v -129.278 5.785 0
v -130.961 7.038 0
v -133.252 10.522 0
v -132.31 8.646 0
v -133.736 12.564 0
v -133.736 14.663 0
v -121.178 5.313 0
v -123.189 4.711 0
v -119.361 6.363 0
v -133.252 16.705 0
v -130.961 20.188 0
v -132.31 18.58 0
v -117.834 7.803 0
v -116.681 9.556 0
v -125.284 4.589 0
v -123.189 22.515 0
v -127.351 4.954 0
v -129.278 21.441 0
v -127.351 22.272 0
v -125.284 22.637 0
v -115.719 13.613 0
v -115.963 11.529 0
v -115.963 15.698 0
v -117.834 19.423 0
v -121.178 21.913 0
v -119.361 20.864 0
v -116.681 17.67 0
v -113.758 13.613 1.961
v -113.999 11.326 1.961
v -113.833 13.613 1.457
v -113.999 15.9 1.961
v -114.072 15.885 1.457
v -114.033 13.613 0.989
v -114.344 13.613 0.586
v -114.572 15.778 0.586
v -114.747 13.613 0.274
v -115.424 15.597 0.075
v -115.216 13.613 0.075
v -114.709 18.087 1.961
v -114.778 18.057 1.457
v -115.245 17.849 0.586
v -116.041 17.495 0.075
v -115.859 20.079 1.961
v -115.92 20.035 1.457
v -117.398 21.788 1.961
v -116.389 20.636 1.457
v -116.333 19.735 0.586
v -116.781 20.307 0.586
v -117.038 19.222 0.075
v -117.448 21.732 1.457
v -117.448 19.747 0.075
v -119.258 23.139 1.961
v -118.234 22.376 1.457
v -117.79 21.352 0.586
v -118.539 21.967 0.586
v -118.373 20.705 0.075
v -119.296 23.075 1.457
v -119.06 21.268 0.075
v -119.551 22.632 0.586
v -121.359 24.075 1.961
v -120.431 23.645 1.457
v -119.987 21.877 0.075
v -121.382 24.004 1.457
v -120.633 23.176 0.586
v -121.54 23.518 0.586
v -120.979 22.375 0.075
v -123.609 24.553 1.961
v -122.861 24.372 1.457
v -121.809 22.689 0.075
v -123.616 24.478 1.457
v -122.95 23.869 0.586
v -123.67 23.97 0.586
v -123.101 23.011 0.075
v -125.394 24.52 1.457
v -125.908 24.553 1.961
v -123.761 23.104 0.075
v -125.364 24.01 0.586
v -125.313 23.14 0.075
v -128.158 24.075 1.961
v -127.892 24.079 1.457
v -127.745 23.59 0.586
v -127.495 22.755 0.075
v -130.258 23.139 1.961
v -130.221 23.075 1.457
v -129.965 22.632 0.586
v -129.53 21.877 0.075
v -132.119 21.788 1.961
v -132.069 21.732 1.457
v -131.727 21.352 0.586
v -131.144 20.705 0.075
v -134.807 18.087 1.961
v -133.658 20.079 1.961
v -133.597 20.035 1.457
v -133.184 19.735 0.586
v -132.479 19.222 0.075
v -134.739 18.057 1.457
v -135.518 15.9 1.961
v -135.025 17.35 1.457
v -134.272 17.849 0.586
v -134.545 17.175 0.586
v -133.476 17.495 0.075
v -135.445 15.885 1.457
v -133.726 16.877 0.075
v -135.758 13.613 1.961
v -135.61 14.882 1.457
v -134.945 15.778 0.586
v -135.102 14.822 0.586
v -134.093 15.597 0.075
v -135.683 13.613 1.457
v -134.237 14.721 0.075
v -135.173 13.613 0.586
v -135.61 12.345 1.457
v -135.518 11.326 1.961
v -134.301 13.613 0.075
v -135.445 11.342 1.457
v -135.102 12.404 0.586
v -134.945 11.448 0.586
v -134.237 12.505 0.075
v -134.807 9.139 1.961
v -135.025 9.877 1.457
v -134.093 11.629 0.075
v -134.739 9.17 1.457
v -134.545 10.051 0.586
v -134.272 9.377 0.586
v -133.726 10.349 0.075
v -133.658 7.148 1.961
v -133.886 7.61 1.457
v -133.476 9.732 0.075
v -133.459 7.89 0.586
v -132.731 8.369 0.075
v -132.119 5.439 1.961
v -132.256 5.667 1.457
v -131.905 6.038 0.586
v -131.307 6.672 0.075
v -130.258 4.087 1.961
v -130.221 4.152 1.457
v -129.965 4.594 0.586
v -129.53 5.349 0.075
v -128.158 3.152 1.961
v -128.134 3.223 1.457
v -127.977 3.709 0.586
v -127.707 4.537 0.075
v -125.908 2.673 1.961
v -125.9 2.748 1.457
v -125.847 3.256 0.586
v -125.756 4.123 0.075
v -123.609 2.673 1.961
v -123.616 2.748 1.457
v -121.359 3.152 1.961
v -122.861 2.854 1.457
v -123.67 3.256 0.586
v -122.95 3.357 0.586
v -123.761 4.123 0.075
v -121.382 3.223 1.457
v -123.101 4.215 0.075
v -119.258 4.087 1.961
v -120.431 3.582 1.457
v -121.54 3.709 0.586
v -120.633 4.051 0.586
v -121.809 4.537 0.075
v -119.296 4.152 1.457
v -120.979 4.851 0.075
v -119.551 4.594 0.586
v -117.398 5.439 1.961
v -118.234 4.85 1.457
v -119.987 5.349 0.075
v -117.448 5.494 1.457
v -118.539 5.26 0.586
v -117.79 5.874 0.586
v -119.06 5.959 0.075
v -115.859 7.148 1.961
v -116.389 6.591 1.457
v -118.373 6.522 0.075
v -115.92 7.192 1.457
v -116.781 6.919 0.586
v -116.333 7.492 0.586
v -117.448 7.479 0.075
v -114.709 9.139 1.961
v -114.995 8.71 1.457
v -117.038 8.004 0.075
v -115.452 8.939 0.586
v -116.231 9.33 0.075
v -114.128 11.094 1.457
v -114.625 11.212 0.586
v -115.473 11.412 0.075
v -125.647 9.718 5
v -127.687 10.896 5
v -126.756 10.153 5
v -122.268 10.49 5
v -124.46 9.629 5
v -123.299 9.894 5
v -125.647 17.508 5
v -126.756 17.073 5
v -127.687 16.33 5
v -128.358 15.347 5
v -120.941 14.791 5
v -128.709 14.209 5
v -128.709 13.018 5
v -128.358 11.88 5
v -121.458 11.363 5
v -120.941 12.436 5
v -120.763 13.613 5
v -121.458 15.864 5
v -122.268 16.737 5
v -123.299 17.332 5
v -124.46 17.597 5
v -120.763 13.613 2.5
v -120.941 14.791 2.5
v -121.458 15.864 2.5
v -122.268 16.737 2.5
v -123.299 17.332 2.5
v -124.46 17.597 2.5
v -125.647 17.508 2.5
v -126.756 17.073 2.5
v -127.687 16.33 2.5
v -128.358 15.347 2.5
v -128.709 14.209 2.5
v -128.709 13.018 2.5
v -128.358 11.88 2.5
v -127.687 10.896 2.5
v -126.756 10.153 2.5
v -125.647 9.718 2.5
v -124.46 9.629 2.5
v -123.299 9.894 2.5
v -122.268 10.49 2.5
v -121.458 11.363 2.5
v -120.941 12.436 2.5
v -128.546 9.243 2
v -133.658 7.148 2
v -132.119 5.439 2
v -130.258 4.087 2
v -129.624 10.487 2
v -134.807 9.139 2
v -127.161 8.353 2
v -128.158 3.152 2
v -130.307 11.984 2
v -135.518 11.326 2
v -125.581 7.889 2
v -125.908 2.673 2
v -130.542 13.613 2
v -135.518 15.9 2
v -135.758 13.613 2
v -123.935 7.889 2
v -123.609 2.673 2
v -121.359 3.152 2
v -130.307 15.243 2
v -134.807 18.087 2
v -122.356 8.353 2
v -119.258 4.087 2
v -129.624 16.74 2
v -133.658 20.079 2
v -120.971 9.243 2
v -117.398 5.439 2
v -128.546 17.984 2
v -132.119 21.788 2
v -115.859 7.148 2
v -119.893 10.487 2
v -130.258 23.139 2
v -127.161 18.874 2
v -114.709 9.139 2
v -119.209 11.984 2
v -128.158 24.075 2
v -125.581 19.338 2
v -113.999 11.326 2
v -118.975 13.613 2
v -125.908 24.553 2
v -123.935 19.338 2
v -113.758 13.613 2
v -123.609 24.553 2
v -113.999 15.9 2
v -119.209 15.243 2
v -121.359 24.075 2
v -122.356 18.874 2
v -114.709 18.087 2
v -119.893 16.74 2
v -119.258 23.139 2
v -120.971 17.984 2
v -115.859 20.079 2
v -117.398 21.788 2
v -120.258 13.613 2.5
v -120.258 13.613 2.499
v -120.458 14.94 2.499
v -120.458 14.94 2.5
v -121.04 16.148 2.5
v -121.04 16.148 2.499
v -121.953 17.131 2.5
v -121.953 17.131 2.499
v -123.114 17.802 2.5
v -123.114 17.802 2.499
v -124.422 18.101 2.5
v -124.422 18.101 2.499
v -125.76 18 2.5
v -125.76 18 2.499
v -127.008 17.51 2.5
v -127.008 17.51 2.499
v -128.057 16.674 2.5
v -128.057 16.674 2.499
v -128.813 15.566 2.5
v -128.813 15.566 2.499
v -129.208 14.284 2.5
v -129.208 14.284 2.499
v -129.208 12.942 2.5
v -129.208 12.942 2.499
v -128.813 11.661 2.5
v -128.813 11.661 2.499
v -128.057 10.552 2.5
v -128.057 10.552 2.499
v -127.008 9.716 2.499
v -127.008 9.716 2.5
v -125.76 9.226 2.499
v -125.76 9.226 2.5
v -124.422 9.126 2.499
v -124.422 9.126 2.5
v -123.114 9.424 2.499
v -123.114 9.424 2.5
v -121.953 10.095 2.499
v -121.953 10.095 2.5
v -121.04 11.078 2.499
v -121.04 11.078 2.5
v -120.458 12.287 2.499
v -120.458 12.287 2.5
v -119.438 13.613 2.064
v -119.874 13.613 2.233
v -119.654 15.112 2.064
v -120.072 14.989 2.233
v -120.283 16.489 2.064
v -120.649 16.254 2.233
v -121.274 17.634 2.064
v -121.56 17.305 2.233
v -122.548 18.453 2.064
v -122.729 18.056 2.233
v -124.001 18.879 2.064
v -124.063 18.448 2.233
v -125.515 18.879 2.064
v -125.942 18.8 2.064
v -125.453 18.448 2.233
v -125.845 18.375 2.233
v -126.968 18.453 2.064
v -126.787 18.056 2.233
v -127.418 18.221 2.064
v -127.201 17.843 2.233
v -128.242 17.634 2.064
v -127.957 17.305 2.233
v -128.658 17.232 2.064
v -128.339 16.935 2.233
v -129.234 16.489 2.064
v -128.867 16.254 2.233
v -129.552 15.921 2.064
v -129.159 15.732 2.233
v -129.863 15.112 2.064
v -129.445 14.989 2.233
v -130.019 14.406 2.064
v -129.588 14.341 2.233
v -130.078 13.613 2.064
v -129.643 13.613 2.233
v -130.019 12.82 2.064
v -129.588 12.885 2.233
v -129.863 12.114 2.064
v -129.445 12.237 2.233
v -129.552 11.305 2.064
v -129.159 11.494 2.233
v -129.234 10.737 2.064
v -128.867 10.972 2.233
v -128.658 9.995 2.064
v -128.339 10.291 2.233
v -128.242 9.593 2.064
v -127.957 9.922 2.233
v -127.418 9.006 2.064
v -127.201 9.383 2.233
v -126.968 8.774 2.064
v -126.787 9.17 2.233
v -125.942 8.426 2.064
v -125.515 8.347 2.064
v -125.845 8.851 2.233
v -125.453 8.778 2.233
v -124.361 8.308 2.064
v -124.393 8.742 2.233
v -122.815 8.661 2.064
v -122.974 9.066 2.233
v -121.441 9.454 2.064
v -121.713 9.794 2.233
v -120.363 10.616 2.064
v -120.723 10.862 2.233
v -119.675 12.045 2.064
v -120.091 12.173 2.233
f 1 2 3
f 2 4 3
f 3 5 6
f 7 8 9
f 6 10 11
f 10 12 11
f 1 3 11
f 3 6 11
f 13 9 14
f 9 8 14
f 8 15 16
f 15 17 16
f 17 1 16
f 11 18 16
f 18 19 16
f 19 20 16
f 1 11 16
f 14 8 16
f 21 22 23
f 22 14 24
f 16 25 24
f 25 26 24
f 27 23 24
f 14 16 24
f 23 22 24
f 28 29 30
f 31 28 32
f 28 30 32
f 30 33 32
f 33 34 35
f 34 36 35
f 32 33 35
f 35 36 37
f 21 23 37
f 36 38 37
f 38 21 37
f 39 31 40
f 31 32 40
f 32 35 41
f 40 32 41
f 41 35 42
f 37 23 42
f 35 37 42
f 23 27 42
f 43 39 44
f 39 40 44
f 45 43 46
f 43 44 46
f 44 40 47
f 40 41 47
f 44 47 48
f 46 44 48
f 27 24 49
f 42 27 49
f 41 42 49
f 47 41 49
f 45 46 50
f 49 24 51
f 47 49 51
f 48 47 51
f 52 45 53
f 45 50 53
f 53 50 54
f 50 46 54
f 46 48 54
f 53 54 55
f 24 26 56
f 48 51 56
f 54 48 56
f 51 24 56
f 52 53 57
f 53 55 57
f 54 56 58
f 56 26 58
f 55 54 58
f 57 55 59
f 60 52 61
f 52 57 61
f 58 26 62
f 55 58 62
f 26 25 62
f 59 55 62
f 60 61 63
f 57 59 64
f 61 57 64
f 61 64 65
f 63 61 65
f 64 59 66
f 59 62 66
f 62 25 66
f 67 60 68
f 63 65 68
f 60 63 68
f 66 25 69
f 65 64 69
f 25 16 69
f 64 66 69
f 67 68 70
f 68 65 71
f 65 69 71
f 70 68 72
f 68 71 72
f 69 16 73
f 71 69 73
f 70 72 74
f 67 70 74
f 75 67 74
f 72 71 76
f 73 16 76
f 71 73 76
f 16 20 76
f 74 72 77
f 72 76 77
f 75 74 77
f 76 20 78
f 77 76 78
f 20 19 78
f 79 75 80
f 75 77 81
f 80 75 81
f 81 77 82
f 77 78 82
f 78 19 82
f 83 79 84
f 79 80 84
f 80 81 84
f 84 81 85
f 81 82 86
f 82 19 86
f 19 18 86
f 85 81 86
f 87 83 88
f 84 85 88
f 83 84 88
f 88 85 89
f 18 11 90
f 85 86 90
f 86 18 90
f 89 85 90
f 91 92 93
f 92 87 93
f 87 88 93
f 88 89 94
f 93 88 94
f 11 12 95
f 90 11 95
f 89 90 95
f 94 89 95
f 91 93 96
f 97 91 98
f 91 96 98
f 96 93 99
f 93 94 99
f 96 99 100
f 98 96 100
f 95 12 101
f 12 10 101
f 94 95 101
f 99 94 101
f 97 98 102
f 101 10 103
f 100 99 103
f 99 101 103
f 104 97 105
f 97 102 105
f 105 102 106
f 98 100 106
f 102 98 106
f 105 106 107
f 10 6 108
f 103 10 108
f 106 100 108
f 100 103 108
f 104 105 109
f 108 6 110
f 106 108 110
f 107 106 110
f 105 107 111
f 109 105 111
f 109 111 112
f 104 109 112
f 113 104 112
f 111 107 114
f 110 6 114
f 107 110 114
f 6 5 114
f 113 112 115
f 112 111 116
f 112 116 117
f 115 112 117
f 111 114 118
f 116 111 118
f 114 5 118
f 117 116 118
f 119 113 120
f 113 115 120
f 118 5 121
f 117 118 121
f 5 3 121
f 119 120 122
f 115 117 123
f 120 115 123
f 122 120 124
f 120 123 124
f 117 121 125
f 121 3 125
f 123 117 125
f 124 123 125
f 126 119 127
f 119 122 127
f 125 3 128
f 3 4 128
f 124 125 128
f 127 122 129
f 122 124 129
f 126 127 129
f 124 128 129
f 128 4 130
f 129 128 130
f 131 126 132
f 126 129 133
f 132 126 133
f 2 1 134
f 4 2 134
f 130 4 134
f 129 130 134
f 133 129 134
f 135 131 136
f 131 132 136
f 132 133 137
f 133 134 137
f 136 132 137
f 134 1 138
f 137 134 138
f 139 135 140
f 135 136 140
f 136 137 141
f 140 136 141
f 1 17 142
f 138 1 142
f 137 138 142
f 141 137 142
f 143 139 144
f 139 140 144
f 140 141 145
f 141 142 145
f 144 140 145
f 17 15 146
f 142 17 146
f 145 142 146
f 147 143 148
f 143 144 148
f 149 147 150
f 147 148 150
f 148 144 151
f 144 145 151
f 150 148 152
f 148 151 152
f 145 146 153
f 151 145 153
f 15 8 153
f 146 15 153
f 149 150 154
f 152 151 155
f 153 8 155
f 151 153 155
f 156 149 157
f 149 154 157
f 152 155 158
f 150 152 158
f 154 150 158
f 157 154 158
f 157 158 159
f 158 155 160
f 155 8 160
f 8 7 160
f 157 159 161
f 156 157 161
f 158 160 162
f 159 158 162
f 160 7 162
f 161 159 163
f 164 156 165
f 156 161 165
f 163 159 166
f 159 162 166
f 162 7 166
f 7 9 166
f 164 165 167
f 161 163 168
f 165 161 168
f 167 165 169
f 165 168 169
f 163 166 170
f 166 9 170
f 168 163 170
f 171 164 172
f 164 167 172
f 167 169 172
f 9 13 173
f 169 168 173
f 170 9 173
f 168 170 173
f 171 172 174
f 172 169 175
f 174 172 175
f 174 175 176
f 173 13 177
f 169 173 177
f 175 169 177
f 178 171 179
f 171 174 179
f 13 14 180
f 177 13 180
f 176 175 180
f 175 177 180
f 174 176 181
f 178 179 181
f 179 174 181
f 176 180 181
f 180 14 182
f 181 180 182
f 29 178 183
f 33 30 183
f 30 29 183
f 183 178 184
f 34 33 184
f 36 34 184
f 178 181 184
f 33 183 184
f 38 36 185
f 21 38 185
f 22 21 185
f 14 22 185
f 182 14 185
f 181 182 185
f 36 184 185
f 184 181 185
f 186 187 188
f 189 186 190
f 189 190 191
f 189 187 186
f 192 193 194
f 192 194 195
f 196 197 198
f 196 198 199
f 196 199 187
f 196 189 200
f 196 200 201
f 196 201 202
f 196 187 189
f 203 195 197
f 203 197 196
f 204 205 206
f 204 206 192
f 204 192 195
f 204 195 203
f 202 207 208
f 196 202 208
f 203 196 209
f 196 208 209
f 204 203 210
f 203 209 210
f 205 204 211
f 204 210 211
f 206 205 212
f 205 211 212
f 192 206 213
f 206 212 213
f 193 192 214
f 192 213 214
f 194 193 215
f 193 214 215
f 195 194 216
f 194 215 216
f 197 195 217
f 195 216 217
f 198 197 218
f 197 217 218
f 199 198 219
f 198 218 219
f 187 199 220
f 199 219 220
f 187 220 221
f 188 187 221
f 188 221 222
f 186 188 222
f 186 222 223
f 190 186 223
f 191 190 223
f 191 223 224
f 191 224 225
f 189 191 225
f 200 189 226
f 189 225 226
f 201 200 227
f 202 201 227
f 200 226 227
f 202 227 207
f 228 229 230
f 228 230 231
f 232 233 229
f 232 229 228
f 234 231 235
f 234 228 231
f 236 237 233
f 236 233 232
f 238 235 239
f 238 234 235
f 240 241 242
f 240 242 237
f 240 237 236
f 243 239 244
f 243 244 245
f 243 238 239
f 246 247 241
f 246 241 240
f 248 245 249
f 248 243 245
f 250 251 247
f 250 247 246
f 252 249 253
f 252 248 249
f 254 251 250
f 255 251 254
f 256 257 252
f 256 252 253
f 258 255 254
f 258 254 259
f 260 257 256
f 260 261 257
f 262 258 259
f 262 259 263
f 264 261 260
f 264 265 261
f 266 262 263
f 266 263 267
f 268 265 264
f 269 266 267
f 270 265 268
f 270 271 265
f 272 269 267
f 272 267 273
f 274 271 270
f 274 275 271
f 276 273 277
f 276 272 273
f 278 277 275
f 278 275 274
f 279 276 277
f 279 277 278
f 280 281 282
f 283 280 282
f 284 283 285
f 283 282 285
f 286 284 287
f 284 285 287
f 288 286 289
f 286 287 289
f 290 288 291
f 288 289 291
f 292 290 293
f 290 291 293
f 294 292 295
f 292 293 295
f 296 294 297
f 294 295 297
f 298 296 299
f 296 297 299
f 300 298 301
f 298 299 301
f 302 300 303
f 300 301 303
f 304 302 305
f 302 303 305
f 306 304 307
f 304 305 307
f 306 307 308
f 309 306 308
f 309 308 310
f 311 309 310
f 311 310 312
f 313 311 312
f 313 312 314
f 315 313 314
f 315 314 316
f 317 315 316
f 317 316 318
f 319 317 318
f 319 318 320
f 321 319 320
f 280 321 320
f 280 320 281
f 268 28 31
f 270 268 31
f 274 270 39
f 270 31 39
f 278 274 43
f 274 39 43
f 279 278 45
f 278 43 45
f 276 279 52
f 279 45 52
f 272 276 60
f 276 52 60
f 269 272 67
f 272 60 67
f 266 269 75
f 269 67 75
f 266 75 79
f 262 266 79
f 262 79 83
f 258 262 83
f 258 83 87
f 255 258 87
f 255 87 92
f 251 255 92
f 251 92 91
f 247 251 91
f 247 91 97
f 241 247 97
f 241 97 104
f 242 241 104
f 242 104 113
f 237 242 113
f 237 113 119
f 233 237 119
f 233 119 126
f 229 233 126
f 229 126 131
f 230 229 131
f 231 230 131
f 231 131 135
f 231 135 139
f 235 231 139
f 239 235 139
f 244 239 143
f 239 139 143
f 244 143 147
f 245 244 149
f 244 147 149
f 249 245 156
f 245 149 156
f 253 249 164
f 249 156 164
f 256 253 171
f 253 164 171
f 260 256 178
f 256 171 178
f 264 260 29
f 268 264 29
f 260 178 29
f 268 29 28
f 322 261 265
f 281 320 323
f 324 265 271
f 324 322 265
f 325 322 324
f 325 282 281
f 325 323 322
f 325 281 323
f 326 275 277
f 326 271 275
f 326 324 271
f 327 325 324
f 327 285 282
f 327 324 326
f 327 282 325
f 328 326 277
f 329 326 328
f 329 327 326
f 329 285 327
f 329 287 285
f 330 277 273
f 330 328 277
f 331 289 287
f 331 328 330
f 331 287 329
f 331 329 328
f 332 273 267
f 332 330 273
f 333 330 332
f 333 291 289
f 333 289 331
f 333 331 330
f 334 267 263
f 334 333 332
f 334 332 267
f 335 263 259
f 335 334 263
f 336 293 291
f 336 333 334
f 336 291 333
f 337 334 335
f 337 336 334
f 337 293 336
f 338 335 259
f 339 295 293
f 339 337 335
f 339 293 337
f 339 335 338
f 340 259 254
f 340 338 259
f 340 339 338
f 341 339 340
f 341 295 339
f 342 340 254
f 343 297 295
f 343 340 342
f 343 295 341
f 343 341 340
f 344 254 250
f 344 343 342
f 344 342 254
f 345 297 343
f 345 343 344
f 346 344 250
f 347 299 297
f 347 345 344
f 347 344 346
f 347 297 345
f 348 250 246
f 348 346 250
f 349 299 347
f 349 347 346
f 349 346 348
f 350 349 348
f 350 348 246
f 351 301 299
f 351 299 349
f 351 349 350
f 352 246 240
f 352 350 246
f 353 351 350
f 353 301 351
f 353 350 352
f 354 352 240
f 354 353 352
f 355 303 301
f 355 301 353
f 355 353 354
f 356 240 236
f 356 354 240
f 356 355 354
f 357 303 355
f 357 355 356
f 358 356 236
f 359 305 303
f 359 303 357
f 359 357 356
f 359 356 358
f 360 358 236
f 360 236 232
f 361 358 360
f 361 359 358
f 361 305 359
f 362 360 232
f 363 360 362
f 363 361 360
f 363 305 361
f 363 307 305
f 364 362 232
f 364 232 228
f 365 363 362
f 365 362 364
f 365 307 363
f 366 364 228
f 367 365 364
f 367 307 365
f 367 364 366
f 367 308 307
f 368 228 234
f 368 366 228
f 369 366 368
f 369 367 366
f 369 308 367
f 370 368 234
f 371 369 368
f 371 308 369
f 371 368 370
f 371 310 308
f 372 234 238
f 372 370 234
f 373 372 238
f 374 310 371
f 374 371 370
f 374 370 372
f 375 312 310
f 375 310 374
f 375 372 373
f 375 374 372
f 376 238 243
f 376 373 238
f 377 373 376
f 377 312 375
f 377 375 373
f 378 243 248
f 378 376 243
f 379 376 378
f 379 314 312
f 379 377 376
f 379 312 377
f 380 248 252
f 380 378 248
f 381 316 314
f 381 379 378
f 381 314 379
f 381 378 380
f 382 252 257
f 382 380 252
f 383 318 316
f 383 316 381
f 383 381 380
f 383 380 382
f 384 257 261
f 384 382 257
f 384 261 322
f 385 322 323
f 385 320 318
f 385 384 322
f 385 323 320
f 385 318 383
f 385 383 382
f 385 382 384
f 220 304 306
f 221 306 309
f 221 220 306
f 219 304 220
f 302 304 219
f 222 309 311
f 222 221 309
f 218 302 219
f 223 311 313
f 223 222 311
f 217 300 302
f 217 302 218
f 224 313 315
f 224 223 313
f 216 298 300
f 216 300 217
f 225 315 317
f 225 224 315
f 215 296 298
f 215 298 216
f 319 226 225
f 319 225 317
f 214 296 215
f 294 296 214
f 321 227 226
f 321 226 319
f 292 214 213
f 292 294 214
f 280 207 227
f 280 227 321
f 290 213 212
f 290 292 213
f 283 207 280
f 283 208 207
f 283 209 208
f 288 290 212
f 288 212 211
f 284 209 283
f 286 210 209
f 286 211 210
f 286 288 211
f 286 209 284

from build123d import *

# Parameters (mm, degrees)
F0_R     = 11
F1_DEPTH = 2
F2_R     = 4.5
F3_DEPTH = 0.5
F4_R     = 3.995
F5_DEPTH = 2.5


# Not quite as in the source:
# - a fillet or chamfer that OpenCascade refuses, or shapes differently, is made with other operations: its cross-section is extruded or revolved along the edge and cut away or added


with BuildPart() as f1:
    # F0 (on Top) → F1 (new body)
    with BuildSketch(Plane.XY):
        with Locations((-124.7583553195, 13.61318212)):
            Circle(F0_R)
    extrude(amount=F1_DEPTH)

    # F2 (on face) → F3 (join)
    with BuildSketch(Plane.XY.offset(2)):
        with Locations((-124.7583553195, 13.61318212)):
            Circle(F2_R)
    extrude(amount=F3_DEPTH)

    # F4 (on face) → F5 (join)
    with BuildSketch(Plane.XY.offset(2.5)):
        with Locations((-124.7583553195, 13.61318212)):
            Circle(F4_R)
    extrude(amount=F5_DEPTH)

    # F6: fillet of radius 2 on 2 edges, made by hand

    # F6_s1 → F6_t2 (revolve)
    with BuildSketch(Plane.XZ.offset(-13.61318212)):
        with BuildLine():
            ThreePointArc((-118.9351147195, 1.9996), (-119.642533578, 2.1287949759), (-120.2586198399, 2.4996999517))
            Line((-120.2586198399, 2.4996999517), (-120.3909703519, 2.3495733784))
            ThreePointArc((-120.3909703519, 2.3495733784), (-120.458491888, 2.2498499759), (-120.458491888, 2))
            Line((-120.458491888, 2), (-120.2583553195, 1.7998634315))
            ThreePointArc((-120.2583553195, 1.7998634315), (-119.5967350195, 1.7998634315), (-118.9351147195, 1.7994634315))
            Line((-118.9351147195, 1.7994634315), (-118.9351147195, 1.9996))
        make_face()
    revolve(axis=Axis((-124.7583553195, 13.61318212, 2), (0, 0, 1)))

    # F6_s3 → F6_t4 (revolve, cut)
    with BuildSketch(Plane.XZ.offset(-13.61318212)):
        with BuildLine():
            ThreePointArc((-113.7579553195, 1.999999807), (-114.3444830549, 0.5854449892), (-115.7593207719, -0.0004))
            Line((-115.7593207719, -0.0004), (-115.7593207719, -0.2005365685))
            ThreePointArc((-115.7593207719, -0.2005365685), (-114.7588380457, -0.2001365685), (-113.7583553195, -0.2001365685))
            Line((-113.7583553195, -0.2001365685), (-113.558218751, 0))
            ThreePointArc((-113.558218751, 0), (-113.558218751, 0.9999999035), (-113.5578187743, 1.9999032191))
            Line((-113.5578187743, 1.9999032191), (-113.7579553195, 1.999999807))
        make_face()
    revolve(axis=Axis((-124.7583553195, 13.61318212, 0), (0, 0, 1)), mode=Mode.SUBTRACT)


solid = f1.part
